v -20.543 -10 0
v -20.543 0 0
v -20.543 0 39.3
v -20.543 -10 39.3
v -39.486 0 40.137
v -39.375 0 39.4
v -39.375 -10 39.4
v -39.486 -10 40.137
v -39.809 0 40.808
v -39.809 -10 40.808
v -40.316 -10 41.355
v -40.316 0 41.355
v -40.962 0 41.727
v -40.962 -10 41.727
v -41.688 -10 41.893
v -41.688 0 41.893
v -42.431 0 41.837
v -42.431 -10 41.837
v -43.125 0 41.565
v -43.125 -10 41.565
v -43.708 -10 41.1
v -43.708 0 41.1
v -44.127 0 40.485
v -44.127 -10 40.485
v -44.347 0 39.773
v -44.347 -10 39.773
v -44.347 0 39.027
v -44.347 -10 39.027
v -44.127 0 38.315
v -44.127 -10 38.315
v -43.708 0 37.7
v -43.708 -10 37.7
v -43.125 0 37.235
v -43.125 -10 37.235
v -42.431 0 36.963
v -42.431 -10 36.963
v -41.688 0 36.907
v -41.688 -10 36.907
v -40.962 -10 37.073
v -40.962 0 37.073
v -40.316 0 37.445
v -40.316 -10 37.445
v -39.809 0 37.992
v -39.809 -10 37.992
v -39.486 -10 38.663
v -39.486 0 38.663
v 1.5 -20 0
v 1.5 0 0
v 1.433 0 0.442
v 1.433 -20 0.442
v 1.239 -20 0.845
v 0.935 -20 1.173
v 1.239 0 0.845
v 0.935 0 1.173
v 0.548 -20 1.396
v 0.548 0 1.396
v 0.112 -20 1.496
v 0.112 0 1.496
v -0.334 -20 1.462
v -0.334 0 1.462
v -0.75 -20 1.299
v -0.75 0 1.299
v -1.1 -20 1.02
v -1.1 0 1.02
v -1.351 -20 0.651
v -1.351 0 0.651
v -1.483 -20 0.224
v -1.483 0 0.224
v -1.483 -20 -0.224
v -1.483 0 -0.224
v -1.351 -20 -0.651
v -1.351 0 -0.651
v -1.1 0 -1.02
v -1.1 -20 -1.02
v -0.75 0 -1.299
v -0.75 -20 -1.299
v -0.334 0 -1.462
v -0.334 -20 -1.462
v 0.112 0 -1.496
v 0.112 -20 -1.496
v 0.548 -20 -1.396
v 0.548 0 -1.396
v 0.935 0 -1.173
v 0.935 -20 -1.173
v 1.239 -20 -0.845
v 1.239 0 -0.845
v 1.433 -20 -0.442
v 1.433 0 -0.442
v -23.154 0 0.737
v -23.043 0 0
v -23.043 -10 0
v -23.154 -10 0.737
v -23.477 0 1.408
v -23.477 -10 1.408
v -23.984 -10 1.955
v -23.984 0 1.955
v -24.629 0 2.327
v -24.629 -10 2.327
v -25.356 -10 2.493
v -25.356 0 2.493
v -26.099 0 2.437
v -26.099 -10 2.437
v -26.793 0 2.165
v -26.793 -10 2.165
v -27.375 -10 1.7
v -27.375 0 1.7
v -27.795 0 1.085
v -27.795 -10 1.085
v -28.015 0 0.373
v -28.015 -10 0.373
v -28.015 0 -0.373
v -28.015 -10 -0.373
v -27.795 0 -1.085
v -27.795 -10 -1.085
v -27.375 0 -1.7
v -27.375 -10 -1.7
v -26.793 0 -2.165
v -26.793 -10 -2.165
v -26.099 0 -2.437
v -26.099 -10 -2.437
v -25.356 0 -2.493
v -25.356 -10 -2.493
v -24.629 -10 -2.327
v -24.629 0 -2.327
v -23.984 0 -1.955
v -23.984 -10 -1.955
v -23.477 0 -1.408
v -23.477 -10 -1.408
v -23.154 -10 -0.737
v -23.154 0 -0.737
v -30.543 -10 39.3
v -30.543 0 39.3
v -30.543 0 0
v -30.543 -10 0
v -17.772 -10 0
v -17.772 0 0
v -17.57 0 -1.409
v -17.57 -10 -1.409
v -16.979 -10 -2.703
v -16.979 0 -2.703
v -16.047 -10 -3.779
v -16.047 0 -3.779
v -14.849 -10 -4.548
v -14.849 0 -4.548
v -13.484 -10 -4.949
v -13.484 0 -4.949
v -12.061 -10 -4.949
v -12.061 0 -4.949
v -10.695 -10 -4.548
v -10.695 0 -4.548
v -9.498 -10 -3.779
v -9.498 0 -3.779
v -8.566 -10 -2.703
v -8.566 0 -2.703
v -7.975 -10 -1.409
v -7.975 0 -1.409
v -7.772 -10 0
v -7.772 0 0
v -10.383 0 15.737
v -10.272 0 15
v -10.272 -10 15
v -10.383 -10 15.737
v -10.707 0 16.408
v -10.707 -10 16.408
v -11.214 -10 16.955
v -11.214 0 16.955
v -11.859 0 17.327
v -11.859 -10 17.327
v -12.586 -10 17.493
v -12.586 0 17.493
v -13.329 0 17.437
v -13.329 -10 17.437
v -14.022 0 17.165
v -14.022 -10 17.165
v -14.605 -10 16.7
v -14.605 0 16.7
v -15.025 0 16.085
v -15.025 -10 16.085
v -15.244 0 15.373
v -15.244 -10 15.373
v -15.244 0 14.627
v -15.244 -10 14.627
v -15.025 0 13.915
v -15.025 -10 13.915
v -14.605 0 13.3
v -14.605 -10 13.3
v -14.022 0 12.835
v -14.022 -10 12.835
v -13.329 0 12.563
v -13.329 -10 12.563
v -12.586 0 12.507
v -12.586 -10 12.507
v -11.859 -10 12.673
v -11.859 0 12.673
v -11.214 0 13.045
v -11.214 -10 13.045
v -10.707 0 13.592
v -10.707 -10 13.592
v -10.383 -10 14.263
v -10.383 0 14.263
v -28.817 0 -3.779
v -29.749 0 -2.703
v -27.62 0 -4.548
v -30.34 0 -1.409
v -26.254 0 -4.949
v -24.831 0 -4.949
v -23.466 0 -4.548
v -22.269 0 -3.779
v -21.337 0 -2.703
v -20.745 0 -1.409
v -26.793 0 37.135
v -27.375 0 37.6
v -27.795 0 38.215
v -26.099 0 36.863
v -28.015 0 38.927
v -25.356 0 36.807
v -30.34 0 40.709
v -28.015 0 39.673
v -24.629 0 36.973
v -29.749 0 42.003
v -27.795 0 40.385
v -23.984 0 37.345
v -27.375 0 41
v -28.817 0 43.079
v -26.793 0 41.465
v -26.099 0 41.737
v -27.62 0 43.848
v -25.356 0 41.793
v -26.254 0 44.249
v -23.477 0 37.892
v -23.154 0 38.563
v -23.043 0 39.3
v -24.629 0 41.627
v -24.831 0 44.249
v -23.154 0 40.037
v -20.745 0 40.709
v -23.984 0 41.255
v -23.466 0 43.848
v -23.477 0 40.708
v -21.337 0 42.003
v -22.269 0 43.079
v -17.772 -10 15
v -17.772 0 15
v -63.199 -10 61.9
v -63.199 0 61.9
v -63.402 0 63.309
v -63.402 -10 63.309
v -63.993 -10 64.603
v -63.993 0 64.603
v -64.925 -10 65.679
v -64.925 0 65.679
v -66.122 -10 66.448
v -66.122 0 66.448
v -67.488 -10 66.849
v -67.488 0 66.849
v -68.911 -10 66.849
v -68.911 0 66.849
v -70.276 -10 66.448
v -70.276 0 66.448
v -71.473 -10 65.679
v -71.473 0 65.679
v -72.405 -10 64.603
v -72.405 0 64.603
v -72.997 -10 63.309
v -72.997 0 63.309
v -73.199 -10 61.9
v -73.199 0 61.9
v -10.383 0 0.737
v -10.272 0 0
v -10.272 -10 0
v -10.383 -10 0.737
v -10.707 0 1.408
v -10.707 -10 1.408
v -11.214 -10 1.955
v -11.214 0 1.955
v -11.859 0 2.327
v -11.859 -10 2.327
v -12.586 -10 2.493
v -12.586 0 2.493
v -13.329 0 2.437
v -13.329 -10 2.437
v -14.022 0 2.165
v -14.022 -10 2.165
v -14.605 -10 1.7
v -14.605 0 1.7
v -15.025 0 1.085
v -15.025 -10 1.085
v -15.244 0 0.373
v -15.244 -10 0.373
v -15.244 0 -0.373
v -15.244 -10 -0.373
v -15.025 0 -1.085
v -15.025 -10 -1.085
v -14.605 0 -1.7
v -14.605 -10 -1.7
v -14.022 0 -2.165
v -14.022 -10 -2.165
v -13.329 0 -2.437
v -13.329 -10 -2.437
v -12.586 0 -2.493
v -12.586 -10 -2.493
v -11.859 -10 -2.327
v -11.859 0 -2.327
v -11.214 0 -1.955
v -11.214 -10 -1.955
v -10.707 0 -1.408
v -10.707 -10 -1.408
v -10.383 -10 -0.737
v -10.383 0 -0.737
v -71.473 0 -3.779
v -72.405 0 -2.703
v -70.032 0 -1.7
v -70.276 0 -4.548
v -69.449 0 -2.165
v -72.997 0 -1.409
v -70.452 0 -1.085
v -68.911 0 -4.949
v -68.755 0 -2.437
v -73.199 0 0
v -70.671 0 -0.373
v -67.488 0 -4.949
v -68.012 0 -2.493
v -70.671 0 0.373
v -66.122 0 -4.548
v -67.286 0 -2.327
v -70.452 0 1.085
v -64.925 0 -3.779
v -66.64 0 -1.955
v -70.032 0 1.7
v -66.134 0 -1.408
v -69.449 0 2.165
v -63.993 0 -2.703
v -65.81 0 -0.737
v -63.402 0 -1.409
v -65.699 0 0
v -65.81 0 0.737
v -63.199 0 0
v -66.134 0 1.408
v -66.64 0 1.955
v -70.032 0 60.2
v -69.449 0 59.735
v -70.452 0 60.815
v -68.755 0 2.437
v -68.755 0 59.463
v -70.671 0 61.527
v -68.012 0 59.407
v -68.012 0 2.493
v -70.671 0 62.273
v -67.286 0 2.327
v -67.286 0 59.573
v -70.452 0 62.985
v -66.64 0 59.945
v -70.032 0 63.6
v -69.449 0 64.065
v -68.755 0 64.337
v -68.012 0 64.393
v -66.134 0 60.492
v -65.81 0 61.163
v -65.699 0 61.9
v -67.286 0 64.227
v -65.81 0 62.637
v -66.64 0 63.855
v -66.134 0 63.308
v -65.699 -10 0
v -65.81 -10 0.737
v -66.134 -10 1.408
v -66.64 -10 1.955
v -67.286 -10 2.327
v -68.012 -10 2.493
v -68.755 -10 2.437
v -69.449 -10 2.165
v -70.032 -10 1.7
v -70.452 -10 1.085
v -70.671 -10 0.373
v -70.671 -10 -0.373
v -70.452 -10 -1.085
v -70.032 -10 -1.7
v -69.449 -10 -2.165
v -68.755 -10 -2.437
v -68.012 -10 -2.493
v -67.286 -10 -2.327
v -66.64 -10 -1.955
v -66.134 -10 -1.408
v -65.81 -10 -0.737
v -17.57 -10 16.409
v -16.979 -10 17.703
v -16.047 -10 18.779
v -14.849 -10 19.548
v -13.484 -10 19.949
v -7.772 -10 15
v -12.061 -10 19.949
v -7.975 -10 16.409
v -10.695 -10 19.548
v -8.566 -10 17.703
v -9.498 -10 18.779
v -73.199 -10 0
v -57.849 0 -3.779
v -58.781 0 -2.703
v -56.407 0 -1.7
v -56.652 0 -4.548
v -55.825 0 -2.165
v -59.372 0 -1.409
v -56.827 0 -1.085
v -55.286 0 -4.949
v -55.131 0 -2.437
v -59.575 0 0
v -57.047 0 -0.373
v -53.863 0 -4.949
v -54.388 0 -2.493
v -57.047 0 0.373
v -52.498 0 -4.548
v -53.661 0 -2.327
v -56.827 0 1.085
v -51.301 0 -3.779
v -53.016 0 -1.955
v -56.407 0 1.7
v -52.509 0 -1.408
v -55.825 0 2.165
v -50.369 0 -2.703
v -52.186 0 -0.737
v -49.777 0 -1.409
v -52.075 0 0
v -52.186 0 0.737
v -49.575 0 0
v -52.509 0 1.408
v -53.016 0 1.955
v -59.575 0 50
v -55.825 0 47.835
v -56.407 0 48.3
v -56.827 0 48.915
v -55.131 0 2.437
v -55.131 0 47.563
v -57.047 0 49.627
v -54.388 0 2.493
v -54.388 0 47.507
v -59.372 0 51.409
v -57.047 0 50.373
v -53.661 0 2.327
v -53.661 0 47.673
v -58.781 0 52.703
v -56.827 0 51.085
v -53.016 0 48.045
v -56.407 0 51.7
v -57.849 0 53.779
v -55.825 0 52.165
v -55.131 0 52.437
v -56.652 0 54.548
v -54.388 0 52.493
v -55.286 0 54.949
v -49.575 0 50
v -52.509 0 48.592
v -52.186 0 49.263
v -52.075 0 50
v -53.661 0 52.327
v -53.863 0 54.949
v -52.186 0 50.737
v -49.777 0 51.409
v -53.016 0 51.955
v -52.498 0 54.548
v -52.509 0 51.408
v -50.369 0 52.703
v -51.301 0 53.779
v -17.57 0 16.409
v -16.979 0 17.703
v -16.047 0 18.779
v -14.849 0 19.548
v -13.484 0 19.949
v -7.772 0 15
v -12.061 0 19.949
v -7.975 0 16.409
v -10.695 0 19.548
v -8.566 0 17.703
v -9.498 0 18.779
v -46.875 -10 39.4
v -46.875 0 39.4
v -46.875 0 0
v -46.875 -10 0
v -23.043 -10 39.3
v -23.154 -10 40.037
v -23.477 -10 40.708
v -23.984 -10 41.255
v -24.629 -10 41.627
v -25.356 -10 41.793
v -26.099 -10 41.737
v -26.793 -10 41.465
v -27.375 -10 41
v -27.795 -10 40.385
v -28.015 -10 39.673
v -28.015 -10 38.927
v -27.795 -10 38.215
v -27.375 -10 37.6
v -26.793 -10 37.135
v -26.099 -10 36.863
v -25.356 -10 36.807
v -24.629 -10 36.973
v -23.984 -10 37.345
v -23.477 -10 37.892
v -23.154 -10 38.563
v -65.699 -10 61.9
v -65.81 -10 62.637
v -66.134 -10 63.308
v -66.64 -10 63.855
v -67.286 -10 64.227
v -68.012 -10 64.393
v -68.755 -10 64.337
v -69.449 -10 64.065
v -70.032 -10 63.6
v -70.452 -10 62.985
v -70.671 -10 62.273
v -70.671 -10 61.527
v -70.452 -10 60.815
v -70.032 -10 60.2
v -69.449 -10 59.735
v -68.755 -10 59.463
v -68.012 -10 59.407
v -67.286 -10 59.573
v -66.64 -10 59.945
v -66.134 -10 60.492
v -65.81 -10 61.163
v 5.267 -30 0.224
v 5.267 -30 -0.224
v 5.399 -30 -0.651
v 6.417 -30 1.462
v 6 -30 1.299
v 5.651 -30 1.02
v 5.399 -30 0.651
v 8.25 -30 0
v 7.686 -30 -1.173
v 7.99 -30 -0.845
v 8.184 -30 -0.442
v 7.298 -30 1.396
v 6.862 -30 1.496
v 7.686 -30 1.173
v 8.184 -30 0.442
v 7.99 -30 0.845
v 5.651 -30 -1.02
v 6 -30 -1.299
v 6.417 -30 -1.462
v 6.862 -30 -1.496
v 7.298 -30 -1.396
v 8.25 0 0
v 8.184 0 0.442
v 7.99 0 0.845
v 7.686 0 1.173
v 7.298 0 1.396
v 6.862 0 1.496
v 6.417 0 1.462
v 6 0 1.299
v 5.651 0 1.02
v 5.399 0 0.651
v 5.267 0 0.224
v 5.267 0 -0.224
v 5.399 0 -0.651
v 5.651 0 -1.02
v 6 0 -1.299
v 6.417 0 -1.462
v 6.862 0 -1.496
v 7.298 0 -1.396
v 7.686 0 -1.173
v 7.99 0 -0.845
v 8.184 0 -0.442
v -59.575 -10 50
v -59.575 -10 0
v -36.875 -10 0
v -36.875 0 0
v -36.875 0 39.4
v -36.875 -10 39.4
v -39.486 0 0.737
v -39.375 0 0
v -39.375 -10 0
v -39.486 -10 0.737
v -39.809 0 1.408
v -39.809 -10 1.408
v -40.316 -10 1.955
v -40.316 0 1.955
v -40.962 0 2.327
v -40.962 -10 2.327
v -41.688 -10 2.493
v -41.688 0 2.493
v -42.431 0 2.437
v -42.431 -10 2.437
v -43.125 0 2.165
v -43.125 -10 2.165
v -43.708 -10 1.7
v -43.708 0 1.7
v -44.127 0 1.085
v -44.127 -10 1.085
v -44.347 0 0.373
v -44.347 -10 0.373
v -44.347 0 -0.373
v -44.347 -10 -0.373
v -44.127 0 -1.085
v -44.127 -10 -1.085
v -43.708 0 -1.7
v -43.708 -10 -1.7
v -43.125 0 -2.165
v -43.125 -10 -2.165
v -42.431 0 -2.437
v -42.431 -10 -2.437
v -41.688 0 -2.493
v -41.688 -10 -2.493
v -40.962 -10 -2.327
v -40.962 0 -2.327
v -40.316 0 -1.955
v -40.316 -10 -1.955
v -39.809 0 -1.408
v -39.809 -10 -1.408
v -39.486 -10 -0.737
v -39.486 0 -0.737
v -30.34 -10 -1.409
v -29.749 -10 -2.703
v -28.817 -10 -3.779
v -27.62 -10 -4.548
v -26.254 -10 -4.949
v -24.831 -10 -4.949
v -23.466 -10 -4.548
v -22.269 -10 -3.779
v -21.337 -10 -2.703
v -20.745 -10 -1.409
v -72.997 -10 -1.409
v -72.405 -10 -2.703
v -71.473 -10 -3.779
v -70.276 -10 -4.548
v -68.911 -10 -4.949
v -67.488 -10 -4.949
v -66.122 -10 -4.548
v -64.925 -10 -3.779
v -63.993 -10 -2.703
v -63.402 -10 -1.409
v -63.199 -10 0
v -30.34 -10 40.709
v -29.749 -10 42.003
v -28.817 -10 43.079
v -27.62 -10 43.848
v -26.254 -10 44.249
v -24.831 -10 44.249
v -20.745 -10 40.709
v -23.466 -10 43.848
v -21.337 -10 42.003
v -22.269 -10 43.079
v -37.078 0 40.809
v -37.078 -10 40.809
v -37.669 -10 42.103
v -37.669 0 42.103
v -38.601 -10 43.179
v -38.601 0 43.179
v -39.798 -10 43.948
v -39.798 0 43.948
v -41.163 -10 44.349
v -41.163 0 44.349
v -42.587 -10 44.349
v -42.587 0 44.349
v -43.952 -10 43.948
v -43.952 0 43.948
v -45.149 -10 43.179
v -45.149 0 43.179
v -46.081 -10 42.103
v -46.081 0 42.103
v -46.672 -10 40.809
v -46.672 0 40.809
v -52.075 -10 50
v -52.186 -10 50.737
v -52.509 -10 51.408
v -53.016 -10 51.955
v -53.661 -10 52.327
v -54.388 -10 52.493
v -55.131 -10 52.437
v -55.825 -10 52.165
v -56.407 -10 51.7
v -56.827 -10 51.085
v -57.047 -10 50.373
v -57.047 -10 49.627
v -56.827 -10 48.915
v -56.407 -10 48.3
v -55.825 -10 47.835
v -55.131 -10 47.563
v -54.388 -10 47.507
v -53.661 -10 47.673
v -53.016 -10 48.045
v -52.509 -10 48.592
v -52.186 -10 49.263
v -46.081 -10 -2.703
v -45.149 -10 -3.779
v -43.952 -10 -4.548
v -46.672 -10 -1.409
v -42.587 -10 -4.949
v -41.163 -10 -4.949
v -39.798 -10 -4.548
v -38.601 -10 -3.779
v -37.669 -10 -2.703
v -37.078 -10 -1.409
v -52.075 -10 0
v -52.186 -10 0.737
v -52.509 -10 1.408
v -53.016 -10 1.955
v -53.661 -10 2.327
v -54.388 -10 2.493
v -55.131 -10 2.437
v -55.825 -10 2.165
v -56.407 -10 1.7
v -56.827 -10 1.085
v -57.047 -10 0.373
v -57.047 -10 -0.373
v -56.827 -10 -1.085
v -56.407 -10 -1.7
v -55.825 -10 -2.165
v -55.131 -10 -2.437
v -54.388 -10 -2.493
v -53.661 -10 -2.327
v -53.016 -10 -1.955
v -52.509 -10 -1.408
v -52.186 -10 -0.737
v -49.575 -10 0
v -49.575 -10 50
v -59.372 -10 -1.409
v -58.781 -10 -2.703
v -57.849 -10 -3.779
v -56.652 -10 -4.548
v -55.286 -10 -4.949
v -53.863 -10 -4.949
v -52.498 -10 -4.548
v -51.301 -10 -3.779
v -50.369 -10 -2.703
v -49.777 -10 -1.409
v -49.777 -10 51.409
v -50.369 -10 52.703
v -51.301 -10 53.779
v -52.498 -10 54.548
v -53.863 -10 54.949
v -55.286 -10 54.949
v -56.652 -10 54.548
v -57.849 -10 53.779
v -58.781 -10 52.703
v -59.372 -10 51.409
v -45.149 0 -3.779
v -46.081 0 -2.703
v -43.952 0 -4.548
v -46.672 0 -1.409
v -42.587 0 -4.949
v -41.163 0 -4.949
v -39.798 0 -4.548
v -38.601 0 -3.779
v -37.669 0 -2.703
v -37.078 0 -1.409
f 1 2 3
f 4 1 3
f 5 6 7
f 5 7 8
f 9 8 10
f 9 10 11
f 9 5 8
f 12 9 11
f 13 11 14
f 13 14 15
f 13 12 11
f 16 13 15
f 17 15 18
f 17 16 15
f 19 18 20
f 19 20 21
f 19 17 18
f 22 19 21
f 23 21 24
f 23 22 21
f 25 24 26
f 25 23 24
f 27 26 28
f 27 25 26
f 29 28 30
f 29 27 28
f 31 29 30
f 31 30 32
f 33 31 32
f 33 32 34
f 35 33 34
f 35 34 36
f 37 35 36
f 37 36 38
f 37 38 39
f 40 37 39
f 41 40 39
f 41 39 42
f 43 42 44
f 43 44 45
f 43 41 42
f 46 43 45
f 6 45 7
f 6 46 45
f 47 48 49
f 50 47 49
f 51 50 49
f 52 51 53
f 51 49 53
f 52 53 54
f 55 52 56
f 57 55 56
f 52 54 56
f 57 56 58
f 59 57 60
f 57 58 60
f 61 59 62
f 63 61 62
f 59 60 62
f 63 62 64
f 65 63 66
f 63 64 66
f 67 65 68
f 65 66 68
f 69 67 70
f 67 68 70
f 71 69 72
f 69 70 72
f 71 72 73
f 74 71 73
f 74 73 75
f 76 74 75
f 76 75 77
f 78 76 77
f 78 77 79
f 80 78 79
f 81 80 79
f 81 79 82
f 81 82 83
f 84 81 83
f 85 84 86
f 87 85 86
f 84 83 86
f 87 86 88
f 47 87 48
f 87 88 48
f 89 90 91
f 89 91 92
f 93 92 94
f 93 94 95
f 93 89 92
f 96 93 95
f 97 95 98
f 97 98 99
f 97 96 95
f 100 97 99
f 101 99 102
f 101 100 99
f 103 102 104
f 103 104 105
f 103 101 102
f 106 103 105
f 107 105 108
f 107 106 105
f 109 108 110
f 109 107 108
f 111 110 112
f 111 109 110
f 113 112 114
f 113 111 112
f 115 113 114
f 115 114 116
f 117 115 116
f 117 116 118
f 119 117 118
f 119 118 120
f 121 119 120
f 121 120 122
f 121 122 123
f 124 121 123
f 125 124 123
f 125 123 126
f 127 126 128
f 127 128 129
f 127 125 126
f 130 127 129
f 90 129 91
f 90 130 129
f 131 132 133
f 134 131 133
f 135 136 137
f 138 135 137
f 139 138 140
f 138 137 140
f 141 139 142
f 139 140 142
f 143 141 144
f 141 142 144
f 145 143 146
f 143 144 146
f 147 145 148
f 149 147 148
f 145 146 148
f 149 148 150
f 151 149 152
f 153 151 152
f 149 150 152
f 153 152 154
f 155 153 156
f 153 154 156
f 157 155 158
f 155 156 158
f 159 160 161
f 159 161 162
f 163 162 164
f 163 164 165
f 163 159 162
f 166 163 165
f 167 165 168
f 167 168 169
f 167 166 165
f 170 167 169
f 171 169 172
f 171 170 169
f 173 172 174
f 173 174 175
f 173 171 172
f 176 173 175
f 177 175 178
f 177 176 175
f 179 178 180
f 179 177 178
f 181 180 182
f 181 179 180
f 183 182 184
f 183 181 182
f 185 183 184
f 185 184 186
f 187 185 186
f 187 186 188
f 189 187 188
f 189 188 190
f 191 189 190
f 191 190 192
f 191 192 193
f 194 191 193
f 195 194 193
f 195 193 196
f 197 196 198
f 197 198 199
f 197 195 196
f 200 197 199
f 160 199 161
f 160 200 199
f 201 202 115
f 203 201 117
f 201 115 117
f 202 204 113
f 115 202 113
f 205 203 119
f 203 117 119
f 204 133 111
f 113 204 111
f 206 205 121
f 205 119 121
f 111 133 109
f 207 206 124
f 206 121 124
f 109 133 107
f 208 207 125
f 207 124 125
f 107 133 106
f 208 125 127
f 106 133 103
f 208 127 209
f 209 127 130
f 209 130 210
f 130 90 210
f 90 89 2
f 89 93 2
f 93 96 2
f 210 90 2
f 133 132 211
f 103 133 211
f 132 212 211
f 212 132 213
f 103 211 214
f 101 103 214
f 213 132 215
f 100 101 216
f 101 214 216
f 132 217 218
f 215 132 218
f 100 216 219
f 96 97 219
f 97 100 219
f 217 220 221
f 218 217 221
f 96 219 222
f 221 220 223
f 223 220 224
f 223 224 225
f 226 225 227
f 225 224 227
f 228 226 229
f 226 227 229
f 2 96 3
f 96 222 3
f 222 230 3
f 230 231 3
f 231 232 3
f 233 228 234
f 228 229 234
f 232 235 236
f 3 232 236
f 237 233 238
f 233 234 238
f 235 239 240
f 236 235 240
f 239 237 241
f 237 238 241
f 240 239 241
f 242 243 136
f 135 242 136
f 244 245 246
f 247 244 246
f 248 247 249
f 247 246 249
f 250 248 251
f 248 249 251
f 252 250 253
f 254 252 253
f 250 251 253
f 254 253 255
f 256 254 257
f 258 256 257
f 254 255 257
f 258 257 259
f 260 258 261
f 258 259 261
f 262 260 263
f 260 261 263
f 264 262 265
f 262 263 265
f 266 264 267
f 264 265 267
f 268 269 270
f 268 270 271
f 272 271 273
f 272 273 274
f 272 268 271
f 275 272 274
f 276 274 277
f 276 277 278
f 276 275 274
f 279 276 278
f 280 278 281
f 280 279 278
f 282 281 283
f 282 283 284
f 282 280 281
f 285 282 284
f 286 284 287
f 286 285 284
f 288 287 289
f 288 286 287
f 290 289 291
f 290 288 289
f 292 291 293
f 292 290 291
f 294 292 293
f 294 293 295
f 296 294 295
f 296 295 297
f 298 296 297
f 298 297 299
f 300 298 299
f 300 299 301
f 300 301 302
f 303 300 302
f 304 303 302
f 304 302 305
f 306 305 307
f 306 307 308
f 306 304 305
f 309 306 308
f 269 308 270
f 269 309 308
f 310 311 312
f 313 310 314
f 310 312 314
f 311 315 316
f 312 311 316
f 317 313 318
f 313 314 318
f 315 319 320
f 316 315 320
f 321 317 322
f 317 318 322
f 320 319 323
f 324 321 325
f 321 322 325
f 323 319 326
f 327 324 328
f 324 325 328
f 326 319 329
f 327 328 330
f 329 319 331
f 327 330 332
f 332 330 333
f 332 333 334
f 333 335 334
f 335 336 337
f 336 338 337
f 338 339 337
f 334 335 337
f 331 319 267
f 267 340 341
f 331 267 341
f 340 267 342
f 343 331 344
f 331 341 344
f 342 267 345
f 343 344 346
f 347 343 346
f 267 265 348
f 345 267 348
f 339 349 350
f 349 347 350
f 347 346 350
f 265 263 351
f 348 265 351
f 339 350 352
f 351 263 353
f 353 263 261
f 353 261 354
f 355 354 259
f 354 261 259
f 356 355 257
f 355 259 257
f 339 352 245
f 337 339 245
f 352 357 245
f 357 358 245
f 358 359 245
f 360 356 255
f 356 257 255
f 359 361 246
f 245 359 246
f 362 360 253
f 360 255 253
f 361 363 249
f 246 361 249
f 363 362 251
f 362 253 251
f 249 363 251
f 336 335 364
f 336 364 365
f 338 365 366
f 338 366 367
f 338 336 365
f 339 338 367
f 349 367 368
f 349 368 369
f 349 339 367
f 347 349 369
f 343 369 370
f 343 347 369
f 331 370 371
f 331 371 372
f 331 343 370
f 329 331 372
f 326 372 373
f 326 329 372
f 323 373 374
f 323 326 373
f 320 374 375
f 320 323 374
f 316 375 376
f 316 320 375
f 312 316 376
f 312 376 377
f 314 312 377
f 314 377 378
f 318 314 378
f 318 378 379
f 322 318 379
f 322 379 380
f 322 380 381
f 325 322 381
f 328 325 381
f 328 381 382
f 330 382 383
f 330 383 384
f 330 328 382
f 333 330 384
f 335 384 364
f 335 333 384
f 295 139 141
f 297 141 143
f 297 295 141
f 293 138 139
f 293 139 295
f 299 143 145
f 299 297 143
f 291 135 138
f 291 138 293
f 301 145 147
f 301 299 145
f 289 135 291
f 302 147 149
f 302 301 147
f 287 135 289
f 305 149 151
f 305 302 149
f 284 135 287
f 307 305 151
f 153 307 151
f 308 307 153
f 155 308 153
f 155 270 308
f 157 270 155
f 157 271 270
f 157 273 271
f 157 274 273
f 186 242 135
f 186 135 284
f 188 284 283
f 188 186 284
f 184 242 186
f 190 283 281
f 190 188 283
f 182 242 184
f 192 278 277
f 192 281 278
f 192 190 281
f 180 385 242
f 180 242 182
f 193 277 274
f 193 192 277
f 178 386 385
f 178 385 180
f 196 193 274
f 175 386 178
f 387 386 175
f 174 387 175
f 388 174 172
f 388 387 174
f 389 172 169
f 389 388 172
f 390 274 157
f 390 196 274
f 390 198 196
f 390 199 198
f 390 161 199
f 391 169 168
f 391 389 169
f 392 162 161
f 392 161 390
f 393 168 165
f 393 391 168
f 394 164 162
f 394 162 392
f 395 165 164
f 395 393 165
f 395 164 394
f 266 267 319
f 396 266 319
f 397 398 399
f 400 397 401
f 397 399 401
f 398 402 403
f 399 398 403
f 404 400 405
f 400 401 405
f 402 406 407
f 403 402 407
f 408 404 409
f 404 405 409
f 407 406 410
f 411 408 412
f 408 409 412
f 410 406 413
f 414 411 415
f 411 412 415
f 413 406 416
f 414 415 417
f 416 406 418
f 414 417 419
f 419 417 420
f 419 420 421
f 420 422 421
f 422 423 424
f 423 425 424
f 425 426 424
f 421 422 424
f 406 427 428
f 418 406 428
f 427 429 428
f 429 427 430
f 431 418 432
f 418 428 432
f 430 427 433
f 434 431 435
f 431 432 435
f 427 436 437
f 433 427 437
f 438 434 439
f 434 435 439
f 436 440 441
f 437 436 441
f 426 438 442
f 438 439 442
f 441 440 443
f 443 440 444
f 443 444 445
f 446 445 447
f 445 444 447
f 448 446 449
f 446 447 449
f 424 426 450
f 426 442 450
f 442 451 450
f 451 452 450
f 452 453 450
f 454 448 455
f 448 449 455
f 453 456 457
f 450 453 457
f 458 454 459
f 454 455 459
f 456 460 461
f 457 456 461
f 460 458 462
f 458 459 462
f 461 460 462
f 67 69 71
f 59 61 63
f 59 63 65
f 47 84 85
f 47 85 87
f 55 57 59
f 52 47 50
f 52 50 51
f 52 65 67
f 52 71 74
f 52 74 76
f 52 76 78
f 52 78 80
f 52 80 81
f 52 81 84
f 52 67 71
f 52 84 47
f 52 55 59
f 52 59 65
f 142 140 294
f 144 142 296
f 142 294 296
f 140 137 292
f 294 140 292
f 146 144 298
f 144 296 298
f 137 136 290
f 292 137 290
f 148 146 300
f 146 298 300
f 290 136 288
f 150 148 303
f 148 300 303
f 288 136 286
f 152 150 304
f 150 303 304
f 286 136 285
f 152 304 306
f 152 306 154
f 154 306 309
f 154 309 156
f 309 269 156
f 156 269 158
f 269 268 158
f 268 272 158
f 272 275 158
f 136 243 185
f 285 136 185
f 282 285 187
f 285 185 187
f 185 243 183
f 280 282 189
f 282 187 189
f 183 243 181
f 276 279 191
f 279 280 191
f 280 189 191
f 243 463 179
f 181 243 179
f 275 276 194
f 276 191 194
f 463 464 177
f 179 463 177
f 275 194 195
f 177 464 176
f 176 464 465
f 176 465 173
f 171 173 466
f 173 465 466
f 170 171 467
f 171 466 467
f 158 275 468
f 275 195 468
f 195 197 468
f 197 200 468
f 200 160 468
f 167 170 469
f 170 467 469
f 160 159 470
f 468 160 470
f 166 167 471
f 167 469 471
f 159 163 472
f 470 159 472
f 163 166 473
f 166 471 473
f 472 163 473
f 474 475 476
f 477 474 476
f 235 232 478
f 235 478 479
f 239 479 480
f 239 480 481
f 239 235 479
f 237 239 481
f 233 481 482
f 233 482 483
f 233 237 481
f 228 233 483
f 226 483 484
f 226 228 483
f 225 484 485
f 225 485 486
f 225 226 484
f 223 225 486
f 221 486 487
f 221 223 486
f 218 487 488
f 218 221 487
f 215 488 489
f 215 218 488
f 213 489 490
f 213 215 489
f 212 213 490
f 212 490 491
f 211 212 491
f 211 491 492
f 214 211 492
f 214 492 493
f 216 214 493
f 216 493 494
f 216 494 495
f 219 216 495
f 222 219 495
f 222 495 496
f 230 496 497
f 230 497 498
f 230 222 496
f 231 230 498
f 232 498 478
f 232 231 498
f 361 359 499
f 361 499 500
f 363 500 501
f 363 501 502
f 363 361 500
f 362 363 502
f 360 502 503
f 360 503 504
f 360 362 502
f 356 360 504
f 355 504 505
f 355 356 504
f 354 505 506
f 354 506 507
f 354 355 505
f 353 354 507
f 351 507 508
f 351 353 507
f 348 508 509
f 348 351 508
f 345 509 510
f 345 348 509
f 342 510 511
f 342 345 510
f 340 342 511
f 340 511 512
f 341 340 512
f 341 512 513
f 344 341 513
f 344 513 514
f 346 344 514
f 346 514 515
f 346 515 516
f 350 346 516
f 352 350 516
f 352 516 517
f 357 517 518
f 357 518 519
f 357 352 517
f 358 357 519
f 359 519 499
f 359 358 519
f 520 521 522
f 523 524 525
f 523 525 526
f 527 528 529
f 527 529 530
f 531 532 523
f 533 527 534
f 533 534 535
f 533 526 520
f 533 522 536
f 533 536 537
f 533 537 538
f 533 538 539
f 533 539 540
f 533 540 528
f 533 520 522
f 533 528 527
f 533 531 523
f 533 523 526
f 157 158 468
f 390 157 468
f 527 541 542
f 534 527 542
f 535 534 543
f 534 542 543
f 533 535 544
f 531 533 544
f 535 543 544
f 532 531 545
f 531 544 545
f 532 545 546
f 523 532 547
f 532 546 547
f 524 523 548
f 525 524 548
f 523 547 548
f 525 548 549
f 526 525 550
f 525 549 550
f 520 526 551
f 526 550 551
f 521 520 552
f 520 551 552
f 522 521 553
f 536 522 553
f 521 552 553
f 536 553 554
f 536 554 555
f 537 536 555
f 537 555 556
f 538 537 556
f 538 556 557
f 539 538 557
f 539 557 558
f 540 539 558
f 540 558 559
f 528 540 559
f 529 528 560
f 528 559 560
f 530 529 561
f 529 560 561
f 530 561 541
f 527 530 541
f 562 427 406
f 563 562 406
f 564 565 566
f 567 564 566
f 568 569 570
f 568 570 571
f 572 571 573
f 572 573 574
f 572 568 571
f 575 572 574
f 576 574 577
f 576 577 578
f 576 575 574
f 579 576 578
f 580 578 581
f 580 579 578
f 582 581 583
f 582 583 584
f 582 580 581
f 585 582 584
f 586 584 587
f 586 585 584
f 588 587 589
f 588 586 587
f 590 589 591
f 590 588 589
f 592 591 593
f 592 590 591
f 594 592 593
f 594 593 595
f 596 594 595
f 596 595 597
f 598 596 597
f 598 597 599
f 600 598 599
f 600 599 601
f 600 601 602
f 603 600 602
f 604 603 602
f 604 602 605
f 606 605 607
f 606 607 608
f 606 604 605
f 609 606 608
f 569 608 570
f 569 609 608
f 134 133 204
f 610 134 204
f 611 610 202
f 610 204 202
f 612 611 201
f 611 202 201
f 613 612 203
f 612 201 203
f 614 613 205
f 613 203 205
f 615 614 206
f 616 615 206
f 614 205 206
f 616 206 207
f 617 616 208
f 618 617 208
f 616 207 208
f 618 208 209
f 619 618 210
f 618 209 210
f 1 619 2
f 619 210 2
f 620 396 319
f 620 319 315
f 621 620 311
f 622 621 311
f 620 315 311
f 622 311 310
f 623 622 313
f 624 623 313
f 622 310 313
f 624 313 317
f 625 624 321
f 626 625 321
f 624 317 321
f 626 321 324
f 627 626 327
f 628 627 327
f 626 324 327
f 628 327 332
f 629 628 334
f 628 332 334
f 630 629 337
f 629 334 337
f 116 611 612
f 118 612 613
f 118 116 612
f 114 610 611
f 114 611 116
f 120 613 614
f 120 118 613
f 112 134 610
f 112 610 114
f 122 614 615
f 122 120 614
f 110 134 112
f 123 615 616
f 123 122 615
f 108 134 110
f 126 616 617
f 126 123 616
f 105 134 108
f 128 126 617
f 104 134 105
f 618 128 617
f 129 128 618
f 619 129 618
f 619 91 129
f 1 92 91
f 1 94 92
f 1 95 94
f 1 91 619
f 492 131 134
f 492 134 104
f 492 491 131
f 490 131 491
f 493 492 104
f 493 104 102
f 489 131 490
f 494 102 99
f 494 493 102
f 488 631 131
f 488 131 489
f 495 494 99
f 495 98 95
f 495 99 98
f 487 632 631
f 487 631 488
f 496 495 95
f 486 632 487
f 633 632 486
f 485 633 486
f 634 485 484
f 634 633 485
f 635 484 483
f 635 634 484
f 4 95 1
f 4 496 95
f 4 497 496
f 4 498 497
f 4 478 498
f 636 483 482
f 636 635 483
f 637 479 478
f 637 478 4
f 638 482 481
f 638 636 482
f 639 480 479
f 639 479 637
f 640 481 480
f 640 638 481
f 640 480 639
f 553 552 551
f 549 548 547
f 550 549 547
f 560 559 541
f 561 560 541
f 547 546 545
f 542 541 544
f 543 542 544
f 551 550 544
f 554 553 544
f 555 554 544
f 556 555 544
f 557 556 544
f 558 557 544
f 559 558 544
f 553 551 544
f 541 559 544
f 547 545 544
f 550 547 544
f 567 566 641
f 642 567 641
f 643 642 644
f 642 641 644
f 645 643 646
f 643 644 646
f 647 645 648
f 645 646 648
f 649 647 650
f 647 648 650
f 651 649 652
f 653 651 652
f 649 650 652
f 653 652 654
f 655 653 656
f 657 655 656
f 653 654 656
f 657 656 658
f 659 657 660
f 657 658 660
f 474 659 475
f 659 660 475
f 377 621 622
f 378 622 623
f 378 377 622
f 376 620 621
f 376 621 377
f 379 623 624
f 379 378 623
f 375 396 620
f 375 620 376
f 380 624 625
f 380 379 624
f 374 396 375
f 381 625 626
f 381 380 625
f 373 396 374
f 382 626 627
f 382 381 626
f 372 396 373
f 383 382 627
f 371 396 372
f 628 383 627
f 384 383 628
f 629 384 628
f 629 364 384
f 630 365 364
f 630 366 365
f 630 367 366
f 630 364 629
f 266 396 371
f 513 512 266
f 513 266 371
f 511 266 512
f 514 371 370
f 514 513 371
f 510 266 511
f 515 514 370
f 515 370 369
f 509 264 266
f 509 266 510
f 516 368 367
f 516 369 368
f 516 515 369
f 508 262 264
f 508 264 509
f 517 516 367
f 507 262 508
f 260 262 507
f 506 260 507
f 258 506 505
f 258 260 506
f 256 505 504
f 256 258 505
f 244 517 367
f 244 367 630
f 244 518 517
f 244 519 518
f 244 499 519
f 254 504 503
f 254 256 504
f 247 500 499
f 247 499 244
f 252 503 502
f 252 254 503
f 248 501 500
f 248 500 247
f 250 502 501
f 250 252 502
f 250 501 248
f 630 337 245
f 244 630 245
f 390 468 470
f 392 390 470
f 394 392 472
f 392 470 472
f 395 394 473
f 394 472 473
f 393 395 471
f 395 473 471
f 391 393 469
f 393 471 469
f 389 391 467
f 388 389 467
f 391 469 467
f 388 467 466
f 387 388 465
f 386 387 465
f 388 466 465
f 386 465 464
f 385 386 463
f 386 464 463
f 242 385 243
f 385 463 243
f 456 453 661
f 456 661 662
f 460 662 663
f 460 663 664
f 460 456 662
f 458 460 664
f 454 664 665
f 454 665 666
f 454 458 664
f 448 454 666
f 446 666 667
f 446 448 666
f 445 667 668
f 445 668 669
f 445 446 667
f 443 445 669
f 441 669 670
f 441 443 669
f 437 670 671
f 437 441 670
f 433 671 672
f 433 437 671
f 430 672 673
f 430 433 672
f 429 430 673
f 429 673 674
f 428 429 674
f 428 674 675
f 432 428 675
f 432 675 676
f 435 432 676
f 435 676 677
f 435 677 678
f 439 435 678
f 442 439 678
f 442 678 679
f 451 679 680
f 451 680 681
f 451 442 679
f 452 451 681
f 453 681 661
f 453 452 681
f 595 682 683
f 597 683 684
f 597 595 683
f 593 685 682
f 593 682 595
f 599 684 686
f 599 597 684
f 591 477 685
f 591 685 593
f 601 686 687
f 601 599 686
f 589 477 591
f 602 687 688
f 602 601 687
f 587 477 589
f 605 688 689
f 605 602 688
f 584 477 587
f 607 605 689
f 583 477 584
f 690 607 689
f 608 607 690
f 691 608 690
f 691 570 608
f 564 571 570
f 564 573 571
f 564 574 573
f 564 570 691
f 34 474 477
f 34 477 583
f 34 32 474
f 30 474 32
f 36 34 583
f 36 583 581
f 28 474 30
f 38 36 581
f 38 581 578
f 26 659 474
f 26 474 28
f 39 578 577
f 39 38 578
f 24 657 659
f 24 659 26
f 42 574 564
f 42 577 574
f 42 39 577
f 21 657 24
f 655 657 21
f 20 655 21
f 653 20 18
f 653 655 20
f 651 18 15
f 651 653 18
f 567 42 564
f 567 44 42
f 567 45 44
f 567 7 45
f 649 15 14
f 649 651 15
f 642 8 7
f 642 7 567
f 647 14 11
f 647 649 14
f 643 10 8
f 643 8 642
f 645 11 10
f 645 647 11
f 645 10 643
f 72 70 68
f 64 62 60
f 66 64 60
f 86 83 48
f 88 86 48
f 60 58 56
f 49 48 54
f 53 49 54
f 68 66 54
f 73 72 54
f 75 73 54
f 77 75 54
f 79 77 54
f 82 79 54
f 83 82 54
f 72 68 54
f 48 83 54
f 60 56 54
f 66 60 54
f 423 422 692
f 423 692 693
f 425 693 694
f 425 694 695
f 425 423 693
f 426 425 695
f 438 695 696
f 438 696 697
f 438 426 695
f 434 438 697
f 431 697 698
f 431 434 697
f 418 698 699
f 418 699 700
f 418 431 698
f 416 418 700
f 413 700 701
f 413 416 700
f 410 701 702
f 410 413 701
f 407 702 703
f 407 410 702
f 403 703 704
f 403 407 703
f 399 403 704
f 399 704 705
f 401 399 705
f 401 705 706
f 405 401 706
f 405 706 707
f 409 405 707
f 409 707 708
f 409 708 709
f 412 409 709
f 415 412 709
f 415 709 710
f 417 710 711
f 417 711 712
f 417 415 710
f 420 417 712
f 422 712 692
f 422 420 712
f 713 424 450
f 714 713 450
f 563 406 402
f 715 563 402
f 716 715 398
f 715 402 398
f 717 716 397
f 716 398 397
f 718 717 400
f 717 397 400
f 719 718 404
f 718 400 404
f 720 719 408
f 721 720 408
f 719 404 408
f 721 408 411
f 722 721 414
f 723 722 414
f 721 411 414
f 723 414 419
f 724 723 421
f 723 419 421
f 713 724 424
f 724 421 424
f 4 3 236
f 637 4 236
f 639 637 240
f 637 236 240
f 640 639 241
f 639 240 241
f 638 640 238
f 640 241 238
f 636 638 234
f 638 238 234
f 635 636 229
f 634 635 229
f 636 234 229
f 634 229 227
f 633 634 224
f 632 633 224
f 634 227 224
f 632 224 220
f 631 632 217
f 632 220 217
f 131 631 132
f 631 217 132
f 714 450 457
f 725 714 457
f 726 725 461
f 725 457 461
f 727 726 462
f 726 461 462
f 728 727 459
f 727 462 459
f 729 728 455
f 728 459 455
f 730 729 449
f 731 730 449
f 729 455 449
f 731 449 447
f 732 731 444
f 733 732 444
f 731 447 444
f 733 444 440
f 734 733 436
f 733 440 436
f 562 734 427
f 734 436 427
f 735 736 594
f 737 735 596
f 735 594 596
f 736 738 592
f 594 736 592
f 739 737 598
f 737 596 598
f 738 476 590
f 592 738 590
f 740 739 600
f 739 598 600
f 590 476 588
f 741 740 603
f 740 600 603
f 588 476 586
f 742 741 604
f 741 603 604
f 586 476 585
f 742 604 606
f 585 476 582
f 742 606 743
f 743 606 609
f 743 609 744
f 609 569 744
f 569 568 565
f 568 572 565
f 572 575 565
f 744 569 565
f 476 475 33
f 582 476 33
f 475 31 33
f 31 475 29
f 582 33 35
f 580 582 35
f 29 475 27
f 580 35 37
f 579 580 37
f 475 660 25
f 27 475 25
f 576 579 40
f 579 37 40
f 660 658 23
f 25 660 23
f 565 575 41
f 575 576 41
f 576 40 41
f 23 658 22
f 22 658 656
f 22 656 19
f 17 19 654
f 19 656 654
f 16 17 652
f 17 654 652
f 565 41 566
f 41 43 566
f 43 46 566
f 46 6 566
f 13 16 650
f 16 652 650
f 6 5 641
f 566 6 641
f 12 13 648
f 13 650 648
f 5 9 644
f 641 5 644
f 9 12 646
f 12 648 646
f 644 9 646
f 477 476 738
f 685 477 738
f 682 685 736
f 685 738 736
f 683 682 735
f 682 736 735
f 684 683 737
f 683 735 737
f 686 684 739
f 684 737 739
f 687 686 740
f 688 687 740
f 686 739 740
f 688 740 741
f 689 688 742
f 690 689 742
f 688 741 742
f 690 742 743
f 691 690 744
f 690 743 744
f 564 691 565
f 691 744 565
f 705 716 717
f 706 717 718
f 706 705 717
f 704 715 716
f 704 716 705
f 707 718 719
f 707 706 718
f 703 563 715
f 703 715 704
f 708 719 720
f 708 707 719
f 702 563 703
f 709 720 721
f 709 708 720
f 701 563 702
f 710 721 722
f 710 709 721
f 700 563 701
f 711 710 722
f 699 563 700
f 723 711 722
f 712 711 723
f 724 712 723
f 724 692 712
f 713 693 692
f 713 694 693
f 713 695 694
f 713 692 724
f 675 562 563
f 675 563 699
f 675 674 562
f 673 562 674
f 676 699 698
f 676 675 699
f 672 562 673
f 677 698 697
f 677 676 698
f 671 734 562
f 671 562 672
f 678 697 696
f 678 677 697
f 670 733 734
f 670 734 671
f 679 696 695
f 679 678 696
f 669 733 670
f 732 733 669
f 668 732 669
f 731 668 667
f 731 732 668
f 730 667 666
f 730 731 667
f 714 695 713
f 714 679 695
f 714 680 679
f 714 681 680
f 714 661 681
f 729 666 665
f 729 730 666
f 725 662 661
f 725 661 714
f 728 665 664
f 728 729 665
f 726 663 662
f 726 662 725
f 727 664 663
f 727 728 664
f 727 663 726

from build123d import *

# Parameters (mm, degrees)
F1_R      = 2.5
F2_DEPTH  = 10
F3_R      = 2.5
F4_DEPTH  = 10
F5_R      = 2.5
F6_DEPTH  = 10
F7_R      = 2.5
F8_DEPTH  = 10
F9_R      = 2.5
F10_DEPTH = 10
F11_R     = 1.5
F12_DEPTH = 20
F13_R     = 1.5
F14_DEPTH = 30


with BuildPart() as f2:
    # F1 (on Front) → F2 (new body)
    with BuildSketch(Plane.XZ):
        with BuildLine():
            Line((-17.7723604936, 15), (-17.7723604936, 0))
            ThreePointArc((-17.7723604936, 0), (-12.7723604936, -5), (-7.7723604936, 0))
            Line((-7.7723604936, 0), (-7.7723604936, 15))
            ThreePointArc((-7.7723604936, 15), (-12.7723604936, 20), (-17.7723604936, 15))
        make_face()
        with Locations((-12.7723604936, 0)):
            Circle(F1_R, mode=Mode.SUBTRACT)
        with Locations((-12.7723604936, 15)):
            Circle(F1_R, mode=Mode.SUBTRACT)
    extrude(amount=F2_DEPTH)


with BuildPart() as f4:
    # F3 (on Front) → F4 (new body)
    with BuildSketch(Plane.XZ):
        with BuildLine():
            Line((-30.5428169801, 39.3), (-30.5428169801, 0))
            ThreePointArc((-30.5428169801, 0), (-25.5428169801, -5), (-20.5428169801, 0))
            Line((-20.5428169801, 0), (-20.5428169801, 39.3))
            ThreePointArc((-20.5428169801, 39.3), (-25.5428169801, 44.3), (-30.5428169801, 39.3))
        make_face()
        with Locations((-25.5428169801, 0)):
            Circle(F3_R, mode=Mode.SUBTRACT)
        with Locations((-25.5428169801, 39.3)):
            Circle(F3_R, mode=Mode.SUBTRACT)
    extrude(amount=F4_DEPTH)


with BuildPart() as f6:
    # F5 (on Front) → F6 (new body)
    with BuildSketch(Plane.XZ):
        with BuildLine():
            Line((-46.8750046201, 39.4), (-46.8750046201, 0))
            ThreePointArc((-46.8750046201, 0), (-41.8750046201, -5), (-36.8750046201, 0))
            Line((-36.8750046201, 0), (-36.8750046201, 39.4))
            ThreePointArc((-36.8750046201, 39.4), (-41.8750046201, 44.4), (-46.8750046201, 39.4))
        make_face()
        with Locations((-41.8750046201, 0)):
            Circle(F5_R, mode=Mode.SUBTRACT)
        with Locations((-41.8750046201, 39.4)):
            Circle(F5_R, mode=Mode.SUBTRACT)
    extrude(amount=F6_DEPTH)


with BuildPart() as f8:
    # F7 (on Front) → F8 (new body)
    with BuildSketch(Plane.XZ):
        with BuildLine():
            Line((-59.5748284761, 50), (-59.5748284761, 0))
            ThreePointArc((-59.5748284761, 0), (-54.5748284761, -5), (-49.5748284761, 0))
            Line((-49.5748284761, 0), (-49.5748284761, 50))
            ThreePointArc((-49.5748284761, 50), (-54.5748284761, 55), (-59.5748284761, 50))
        make_face()
        with Locations((-54.5748284761, 0)):
            Circle(F7_R, mode=Mode.SUBTRACT)
        with Locations((-54.5748284761, 50)):
            Circle(F7_R, mode=Mode.SUBTRACT)
    extrude(amount=F8_DEPTH)


with BuildPart() as f10:
    # F9 (on Front) → F10 (new body)
    with BuildSketch(Plane.XZ):
        with BuildLine():
            Line((-73.1991949677, 61.9), (-73.1991949677, 0))
            ThreePointArc((-73.1991949677, 0), (-68.1991949677, -5), (-63.1991949677, 0))
            Line((-63.1991949677, 0), (-63.1991949677, 61.9))
            ThreePointArc((-63.1991949677, 61.9), (-68.1991949677, 66.9), (-73.1991949677, 61.9))
        make_face()
        with Locations((-68.1991949677, 0)):
            Circle(F9_R, mode=Mode.SUBTRACT)
        with Locations((-68.1991949677, 61.9)):
            Circle(F9_R, mode=Mode.SUBTRACT)
    extrude(amount=F10_DEPTH)


with BuildPart() as f12:
    # F11 (on Front) → F12 (new body)
    with BuildSketch(Plane.XZ):
        Circle(F11_R)
    extrude(amount=F12_DEPTH)


with BuildPart() as f14:
    # F13 (on Front) → F14 (new body)
    with BuildSketch(Plane.XZ):
        with Locations((6.7503562369, 0)):
            Circle(F13_R)
    extrude(amount=F14_DEPTH)


solid = Compound([f2.part, f4.part, f6.part, f8.part, f10.part, f12.part, f14.part])
